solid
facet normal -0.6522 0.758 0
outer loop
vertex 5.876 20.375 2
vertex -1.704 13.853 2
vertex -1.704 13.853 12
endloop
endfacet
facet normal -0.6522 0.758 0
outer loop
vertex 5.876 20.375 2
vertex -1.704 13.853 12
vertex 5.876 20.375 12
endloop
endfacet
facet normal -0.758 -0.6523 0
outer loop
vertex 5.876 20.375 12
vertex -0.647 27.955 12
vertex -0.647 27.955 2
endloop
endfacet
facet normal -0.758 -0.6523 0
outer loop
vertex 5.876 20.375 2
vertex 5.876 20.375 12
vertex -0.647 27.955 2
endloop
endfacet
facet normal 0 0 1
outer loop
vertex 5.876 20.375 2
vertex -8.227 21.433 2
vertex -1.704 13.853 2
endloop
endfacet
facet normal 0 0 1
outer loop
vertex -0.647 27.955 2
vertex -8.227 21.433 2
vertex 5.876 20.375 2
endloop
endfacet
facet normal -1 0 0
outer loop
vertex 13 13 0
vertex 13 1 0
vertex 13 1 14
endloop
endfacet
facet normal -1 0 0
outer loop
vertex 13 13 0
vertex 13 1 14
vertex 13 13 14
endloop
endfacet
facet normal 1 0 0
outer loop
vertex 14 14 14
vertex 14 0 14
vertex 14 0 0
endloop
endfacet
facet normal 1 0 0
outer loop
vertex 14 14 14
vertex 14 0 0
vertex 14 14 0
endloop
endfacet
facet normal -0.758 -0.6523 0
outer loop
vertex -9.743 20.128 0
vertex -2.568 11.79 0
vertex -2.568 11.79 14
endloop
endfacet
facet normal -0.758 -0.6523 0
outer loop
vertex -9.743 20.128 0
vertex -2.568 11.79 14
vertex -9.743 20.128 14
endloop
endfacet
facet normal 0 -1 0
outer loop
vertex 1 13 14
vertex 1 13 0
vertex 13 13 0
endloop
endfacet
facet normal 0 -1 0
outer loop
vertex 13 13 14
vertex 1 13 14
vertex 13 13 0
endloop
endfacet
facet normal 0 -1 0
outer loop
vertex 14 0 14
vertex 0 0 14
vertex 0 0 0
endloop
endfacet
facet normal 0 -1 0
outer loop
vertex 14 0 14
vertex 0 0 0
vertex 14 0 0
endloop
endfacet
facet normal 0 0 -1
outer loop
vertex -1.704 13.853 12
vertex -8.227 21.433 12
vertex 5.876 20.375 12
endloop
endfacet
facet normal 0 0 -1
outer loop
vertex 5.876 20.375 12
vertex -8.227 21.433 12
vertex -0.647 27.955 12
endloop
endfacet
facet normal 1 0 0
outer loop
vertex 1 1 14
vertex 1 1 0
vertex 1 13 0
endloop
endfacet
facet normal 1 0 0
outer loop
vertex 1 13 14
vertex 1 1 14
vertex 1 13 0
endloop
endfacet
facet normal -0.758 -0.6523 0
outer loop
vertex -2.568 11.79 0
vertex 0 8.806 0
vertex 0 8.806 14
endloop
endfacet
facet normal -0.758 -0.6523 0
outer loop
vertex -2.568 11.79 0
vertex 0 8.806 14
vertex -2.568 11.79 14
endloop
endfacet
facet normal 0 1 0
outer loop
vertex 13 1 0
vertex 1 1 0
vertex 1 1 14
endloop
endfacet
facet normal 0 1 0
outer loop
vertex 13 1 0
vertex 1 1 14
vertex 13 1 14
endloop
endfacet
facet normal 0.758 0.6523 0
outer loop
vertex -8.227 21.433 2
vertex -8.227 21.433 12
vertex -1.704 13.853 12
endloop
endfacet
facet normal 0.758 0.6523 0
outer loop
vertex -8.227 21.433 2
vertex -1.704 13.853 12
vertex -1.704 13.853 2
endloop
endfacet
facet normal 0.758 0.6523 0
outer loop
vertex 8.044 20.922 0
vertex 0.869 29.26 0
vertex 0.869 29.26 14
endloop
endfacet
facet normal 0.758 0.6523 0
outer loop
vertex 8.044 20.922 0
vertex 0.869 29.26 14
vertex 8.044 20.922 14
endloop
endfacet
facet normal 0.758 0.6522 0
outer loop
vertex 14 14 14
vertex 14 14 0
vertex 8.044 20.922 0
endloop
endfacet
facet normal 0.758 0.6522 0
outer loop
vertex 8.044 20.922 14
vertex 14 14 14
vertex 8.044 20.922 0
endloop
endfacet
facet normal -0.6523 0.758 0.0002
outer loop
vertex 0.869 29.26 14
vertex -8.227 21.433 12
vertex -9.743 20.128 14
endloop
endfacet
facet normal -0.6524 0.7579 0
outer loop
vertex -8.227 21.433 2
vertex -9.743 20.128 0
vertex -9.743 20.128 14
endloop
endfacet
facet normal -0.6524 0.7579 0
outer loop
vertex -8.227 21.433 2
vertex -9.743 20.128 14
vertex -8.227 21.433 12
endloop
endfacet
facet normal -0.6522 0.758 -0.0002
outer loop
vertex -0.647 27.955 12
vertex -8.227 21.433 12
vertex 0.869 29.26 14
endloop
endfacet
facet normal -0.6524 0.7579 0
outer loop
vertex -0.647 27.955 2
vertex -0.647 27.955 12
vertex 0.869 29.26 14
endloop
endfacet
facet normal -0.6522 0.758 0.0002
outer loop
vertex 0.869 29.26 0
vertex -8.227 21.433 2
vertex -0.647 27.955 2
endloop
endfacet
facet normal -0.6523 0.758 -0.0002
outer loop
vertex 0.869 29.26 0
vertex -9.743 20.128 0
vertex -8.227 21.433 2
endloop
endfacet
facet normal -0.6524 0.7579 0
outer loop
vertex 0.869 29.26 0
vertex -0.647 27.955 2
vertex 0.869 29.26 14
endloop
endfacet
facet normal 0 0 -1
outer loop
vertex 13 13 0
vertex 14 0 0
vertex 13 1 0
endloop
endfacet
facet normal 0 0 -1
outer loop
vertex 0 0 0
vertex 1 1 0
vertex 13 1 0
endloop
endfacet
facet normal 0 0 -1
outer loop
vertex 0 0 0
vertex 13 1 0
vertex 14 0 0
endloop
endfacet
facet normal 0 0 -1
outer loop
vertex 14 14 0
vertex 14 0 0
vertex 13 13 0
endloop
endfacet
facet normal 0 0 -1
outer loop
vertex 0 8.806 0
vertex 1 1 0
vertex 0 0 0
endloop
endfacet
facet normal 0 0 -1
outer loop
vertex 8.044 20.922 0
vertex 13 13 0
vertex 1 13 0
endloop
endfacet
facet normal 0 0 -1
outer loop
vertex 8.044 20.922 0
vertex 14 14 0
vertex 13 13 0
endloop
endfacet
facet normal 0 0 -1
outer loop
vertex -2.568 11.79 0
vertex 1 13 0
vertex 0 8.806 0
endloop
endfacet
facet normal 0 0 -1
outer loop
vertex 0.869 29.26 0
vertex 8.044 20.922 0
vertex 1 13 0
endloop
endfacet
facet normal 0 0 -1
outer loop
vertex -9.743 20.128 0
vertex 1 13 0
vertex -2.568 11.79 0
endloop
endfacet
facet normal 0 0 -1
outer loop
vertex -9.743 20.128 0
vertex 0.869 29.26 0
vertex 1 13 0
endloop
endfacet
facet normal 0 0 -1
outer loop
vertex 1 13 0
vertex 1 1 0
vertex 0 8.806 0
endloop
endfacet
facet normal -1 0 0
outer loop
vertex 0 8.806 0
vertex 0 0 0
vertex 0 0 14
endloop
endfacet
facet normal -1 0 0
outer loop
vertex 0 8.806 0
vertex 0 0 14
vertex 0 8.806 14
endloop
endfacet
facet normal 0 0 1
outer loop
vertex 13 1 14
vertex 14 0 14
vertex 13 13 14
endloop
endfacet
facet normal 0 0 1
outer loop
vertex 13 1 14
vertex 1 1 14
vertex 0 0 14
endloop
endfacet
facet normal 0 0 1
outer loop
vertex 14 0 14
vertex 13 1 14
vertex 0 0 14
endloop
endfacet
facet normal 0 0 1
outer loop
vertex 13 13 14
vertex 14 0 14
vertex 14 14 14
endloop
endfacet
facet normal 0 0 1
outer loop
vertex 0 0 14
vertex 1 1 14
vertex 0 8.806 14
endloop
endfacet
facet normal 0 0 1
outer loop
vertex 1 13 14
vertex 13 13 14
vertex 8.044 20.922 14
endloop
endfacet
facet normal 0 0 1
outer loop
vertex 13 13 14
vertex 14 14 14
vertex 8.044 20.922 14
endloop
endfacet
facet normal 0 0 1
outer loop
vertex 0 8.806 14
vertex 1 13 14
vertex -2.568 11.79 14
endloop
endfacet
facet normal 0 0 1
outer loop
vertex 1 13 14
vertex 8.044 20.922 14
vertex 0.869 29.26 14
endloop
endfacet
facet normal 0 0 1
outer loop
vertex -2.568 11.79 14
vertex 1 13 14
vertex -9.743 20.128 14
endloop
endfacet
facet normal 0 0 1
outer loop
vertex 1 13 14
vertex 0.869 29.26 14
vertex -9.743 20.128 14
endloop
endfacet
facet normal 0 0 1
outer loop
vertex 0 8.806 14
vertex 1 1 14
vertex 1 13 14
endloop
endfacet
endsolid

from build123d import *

# Parameters (mm, degrees)
SKETCH_1_W          = 14
SKETCH_1_H          = 14
SKETCH_1_W_2        = 12
SKETCH_1_H_2        = 12
EXTRUDE_1_DEPTH     = 14
EXTRUDE_3_DEPTH     = 14
SKETCH_3_W          = 10
SKETCH_3_H          = 10
CUT_EXTRUDE_1_DEPTH = 10


with BuildPart() as part:
    # 草图1 → 凸台-拉伸1 (new body)
    with BuildSketch(Plane.XY):
        with Locations((7, 7)):
            Rectangle(SKETCH_1_W, SKETCH_1_H)
        with Locations((7, 7)):
            Rectangle(SKETCH_1_W_2, SKETCH_1_H_2, mode=Mode.SUBTRACT)
    extrude(amount=EXTRUDE_1_DEPTH)

    # 草图2 → 凸台-拉伸3 (add)
    with BuildSketch(Plane(origin=(0, 0, 0), x_dir=(-1, 0, 0), z_dir=(0, 0, -1))):
        Polygon((-0.869466018, 29.259809863), (-8.044126787, 20.92169), (0, 14), (2.568025419, 11.790303866), (9.742686188, 20.128423729), align=None)
        Polygon((-13.999999155, 14), (-8.044126787, 20.92169), (0, 14), align=None)
        Polygon((2.568025419, 11.790303866), (0, 14), (0, 8.805841681), align=None)
    extrude(amount=-EXTRUDE_3_DEPTH)

    # 草图3 → 切除-拉伸1 (cut)
    with BuildSketch(Plane(origin=(-14.096351186, 16.382247136, 0), x_dir=(0.75801089666448, 0.6522418880583423, 0), z_dir=(-0.6522418880583423, 0.75801089666448, 0))):
        with Locations((12.743538804, -7)):
            Rectangle(SKETCH_3_W, SKETCH_3_H)
    extrude(amount=-CUT_EXTRUDE_1_DEPTH, mode=Mode.SUBTRACT)


solid = part.part
